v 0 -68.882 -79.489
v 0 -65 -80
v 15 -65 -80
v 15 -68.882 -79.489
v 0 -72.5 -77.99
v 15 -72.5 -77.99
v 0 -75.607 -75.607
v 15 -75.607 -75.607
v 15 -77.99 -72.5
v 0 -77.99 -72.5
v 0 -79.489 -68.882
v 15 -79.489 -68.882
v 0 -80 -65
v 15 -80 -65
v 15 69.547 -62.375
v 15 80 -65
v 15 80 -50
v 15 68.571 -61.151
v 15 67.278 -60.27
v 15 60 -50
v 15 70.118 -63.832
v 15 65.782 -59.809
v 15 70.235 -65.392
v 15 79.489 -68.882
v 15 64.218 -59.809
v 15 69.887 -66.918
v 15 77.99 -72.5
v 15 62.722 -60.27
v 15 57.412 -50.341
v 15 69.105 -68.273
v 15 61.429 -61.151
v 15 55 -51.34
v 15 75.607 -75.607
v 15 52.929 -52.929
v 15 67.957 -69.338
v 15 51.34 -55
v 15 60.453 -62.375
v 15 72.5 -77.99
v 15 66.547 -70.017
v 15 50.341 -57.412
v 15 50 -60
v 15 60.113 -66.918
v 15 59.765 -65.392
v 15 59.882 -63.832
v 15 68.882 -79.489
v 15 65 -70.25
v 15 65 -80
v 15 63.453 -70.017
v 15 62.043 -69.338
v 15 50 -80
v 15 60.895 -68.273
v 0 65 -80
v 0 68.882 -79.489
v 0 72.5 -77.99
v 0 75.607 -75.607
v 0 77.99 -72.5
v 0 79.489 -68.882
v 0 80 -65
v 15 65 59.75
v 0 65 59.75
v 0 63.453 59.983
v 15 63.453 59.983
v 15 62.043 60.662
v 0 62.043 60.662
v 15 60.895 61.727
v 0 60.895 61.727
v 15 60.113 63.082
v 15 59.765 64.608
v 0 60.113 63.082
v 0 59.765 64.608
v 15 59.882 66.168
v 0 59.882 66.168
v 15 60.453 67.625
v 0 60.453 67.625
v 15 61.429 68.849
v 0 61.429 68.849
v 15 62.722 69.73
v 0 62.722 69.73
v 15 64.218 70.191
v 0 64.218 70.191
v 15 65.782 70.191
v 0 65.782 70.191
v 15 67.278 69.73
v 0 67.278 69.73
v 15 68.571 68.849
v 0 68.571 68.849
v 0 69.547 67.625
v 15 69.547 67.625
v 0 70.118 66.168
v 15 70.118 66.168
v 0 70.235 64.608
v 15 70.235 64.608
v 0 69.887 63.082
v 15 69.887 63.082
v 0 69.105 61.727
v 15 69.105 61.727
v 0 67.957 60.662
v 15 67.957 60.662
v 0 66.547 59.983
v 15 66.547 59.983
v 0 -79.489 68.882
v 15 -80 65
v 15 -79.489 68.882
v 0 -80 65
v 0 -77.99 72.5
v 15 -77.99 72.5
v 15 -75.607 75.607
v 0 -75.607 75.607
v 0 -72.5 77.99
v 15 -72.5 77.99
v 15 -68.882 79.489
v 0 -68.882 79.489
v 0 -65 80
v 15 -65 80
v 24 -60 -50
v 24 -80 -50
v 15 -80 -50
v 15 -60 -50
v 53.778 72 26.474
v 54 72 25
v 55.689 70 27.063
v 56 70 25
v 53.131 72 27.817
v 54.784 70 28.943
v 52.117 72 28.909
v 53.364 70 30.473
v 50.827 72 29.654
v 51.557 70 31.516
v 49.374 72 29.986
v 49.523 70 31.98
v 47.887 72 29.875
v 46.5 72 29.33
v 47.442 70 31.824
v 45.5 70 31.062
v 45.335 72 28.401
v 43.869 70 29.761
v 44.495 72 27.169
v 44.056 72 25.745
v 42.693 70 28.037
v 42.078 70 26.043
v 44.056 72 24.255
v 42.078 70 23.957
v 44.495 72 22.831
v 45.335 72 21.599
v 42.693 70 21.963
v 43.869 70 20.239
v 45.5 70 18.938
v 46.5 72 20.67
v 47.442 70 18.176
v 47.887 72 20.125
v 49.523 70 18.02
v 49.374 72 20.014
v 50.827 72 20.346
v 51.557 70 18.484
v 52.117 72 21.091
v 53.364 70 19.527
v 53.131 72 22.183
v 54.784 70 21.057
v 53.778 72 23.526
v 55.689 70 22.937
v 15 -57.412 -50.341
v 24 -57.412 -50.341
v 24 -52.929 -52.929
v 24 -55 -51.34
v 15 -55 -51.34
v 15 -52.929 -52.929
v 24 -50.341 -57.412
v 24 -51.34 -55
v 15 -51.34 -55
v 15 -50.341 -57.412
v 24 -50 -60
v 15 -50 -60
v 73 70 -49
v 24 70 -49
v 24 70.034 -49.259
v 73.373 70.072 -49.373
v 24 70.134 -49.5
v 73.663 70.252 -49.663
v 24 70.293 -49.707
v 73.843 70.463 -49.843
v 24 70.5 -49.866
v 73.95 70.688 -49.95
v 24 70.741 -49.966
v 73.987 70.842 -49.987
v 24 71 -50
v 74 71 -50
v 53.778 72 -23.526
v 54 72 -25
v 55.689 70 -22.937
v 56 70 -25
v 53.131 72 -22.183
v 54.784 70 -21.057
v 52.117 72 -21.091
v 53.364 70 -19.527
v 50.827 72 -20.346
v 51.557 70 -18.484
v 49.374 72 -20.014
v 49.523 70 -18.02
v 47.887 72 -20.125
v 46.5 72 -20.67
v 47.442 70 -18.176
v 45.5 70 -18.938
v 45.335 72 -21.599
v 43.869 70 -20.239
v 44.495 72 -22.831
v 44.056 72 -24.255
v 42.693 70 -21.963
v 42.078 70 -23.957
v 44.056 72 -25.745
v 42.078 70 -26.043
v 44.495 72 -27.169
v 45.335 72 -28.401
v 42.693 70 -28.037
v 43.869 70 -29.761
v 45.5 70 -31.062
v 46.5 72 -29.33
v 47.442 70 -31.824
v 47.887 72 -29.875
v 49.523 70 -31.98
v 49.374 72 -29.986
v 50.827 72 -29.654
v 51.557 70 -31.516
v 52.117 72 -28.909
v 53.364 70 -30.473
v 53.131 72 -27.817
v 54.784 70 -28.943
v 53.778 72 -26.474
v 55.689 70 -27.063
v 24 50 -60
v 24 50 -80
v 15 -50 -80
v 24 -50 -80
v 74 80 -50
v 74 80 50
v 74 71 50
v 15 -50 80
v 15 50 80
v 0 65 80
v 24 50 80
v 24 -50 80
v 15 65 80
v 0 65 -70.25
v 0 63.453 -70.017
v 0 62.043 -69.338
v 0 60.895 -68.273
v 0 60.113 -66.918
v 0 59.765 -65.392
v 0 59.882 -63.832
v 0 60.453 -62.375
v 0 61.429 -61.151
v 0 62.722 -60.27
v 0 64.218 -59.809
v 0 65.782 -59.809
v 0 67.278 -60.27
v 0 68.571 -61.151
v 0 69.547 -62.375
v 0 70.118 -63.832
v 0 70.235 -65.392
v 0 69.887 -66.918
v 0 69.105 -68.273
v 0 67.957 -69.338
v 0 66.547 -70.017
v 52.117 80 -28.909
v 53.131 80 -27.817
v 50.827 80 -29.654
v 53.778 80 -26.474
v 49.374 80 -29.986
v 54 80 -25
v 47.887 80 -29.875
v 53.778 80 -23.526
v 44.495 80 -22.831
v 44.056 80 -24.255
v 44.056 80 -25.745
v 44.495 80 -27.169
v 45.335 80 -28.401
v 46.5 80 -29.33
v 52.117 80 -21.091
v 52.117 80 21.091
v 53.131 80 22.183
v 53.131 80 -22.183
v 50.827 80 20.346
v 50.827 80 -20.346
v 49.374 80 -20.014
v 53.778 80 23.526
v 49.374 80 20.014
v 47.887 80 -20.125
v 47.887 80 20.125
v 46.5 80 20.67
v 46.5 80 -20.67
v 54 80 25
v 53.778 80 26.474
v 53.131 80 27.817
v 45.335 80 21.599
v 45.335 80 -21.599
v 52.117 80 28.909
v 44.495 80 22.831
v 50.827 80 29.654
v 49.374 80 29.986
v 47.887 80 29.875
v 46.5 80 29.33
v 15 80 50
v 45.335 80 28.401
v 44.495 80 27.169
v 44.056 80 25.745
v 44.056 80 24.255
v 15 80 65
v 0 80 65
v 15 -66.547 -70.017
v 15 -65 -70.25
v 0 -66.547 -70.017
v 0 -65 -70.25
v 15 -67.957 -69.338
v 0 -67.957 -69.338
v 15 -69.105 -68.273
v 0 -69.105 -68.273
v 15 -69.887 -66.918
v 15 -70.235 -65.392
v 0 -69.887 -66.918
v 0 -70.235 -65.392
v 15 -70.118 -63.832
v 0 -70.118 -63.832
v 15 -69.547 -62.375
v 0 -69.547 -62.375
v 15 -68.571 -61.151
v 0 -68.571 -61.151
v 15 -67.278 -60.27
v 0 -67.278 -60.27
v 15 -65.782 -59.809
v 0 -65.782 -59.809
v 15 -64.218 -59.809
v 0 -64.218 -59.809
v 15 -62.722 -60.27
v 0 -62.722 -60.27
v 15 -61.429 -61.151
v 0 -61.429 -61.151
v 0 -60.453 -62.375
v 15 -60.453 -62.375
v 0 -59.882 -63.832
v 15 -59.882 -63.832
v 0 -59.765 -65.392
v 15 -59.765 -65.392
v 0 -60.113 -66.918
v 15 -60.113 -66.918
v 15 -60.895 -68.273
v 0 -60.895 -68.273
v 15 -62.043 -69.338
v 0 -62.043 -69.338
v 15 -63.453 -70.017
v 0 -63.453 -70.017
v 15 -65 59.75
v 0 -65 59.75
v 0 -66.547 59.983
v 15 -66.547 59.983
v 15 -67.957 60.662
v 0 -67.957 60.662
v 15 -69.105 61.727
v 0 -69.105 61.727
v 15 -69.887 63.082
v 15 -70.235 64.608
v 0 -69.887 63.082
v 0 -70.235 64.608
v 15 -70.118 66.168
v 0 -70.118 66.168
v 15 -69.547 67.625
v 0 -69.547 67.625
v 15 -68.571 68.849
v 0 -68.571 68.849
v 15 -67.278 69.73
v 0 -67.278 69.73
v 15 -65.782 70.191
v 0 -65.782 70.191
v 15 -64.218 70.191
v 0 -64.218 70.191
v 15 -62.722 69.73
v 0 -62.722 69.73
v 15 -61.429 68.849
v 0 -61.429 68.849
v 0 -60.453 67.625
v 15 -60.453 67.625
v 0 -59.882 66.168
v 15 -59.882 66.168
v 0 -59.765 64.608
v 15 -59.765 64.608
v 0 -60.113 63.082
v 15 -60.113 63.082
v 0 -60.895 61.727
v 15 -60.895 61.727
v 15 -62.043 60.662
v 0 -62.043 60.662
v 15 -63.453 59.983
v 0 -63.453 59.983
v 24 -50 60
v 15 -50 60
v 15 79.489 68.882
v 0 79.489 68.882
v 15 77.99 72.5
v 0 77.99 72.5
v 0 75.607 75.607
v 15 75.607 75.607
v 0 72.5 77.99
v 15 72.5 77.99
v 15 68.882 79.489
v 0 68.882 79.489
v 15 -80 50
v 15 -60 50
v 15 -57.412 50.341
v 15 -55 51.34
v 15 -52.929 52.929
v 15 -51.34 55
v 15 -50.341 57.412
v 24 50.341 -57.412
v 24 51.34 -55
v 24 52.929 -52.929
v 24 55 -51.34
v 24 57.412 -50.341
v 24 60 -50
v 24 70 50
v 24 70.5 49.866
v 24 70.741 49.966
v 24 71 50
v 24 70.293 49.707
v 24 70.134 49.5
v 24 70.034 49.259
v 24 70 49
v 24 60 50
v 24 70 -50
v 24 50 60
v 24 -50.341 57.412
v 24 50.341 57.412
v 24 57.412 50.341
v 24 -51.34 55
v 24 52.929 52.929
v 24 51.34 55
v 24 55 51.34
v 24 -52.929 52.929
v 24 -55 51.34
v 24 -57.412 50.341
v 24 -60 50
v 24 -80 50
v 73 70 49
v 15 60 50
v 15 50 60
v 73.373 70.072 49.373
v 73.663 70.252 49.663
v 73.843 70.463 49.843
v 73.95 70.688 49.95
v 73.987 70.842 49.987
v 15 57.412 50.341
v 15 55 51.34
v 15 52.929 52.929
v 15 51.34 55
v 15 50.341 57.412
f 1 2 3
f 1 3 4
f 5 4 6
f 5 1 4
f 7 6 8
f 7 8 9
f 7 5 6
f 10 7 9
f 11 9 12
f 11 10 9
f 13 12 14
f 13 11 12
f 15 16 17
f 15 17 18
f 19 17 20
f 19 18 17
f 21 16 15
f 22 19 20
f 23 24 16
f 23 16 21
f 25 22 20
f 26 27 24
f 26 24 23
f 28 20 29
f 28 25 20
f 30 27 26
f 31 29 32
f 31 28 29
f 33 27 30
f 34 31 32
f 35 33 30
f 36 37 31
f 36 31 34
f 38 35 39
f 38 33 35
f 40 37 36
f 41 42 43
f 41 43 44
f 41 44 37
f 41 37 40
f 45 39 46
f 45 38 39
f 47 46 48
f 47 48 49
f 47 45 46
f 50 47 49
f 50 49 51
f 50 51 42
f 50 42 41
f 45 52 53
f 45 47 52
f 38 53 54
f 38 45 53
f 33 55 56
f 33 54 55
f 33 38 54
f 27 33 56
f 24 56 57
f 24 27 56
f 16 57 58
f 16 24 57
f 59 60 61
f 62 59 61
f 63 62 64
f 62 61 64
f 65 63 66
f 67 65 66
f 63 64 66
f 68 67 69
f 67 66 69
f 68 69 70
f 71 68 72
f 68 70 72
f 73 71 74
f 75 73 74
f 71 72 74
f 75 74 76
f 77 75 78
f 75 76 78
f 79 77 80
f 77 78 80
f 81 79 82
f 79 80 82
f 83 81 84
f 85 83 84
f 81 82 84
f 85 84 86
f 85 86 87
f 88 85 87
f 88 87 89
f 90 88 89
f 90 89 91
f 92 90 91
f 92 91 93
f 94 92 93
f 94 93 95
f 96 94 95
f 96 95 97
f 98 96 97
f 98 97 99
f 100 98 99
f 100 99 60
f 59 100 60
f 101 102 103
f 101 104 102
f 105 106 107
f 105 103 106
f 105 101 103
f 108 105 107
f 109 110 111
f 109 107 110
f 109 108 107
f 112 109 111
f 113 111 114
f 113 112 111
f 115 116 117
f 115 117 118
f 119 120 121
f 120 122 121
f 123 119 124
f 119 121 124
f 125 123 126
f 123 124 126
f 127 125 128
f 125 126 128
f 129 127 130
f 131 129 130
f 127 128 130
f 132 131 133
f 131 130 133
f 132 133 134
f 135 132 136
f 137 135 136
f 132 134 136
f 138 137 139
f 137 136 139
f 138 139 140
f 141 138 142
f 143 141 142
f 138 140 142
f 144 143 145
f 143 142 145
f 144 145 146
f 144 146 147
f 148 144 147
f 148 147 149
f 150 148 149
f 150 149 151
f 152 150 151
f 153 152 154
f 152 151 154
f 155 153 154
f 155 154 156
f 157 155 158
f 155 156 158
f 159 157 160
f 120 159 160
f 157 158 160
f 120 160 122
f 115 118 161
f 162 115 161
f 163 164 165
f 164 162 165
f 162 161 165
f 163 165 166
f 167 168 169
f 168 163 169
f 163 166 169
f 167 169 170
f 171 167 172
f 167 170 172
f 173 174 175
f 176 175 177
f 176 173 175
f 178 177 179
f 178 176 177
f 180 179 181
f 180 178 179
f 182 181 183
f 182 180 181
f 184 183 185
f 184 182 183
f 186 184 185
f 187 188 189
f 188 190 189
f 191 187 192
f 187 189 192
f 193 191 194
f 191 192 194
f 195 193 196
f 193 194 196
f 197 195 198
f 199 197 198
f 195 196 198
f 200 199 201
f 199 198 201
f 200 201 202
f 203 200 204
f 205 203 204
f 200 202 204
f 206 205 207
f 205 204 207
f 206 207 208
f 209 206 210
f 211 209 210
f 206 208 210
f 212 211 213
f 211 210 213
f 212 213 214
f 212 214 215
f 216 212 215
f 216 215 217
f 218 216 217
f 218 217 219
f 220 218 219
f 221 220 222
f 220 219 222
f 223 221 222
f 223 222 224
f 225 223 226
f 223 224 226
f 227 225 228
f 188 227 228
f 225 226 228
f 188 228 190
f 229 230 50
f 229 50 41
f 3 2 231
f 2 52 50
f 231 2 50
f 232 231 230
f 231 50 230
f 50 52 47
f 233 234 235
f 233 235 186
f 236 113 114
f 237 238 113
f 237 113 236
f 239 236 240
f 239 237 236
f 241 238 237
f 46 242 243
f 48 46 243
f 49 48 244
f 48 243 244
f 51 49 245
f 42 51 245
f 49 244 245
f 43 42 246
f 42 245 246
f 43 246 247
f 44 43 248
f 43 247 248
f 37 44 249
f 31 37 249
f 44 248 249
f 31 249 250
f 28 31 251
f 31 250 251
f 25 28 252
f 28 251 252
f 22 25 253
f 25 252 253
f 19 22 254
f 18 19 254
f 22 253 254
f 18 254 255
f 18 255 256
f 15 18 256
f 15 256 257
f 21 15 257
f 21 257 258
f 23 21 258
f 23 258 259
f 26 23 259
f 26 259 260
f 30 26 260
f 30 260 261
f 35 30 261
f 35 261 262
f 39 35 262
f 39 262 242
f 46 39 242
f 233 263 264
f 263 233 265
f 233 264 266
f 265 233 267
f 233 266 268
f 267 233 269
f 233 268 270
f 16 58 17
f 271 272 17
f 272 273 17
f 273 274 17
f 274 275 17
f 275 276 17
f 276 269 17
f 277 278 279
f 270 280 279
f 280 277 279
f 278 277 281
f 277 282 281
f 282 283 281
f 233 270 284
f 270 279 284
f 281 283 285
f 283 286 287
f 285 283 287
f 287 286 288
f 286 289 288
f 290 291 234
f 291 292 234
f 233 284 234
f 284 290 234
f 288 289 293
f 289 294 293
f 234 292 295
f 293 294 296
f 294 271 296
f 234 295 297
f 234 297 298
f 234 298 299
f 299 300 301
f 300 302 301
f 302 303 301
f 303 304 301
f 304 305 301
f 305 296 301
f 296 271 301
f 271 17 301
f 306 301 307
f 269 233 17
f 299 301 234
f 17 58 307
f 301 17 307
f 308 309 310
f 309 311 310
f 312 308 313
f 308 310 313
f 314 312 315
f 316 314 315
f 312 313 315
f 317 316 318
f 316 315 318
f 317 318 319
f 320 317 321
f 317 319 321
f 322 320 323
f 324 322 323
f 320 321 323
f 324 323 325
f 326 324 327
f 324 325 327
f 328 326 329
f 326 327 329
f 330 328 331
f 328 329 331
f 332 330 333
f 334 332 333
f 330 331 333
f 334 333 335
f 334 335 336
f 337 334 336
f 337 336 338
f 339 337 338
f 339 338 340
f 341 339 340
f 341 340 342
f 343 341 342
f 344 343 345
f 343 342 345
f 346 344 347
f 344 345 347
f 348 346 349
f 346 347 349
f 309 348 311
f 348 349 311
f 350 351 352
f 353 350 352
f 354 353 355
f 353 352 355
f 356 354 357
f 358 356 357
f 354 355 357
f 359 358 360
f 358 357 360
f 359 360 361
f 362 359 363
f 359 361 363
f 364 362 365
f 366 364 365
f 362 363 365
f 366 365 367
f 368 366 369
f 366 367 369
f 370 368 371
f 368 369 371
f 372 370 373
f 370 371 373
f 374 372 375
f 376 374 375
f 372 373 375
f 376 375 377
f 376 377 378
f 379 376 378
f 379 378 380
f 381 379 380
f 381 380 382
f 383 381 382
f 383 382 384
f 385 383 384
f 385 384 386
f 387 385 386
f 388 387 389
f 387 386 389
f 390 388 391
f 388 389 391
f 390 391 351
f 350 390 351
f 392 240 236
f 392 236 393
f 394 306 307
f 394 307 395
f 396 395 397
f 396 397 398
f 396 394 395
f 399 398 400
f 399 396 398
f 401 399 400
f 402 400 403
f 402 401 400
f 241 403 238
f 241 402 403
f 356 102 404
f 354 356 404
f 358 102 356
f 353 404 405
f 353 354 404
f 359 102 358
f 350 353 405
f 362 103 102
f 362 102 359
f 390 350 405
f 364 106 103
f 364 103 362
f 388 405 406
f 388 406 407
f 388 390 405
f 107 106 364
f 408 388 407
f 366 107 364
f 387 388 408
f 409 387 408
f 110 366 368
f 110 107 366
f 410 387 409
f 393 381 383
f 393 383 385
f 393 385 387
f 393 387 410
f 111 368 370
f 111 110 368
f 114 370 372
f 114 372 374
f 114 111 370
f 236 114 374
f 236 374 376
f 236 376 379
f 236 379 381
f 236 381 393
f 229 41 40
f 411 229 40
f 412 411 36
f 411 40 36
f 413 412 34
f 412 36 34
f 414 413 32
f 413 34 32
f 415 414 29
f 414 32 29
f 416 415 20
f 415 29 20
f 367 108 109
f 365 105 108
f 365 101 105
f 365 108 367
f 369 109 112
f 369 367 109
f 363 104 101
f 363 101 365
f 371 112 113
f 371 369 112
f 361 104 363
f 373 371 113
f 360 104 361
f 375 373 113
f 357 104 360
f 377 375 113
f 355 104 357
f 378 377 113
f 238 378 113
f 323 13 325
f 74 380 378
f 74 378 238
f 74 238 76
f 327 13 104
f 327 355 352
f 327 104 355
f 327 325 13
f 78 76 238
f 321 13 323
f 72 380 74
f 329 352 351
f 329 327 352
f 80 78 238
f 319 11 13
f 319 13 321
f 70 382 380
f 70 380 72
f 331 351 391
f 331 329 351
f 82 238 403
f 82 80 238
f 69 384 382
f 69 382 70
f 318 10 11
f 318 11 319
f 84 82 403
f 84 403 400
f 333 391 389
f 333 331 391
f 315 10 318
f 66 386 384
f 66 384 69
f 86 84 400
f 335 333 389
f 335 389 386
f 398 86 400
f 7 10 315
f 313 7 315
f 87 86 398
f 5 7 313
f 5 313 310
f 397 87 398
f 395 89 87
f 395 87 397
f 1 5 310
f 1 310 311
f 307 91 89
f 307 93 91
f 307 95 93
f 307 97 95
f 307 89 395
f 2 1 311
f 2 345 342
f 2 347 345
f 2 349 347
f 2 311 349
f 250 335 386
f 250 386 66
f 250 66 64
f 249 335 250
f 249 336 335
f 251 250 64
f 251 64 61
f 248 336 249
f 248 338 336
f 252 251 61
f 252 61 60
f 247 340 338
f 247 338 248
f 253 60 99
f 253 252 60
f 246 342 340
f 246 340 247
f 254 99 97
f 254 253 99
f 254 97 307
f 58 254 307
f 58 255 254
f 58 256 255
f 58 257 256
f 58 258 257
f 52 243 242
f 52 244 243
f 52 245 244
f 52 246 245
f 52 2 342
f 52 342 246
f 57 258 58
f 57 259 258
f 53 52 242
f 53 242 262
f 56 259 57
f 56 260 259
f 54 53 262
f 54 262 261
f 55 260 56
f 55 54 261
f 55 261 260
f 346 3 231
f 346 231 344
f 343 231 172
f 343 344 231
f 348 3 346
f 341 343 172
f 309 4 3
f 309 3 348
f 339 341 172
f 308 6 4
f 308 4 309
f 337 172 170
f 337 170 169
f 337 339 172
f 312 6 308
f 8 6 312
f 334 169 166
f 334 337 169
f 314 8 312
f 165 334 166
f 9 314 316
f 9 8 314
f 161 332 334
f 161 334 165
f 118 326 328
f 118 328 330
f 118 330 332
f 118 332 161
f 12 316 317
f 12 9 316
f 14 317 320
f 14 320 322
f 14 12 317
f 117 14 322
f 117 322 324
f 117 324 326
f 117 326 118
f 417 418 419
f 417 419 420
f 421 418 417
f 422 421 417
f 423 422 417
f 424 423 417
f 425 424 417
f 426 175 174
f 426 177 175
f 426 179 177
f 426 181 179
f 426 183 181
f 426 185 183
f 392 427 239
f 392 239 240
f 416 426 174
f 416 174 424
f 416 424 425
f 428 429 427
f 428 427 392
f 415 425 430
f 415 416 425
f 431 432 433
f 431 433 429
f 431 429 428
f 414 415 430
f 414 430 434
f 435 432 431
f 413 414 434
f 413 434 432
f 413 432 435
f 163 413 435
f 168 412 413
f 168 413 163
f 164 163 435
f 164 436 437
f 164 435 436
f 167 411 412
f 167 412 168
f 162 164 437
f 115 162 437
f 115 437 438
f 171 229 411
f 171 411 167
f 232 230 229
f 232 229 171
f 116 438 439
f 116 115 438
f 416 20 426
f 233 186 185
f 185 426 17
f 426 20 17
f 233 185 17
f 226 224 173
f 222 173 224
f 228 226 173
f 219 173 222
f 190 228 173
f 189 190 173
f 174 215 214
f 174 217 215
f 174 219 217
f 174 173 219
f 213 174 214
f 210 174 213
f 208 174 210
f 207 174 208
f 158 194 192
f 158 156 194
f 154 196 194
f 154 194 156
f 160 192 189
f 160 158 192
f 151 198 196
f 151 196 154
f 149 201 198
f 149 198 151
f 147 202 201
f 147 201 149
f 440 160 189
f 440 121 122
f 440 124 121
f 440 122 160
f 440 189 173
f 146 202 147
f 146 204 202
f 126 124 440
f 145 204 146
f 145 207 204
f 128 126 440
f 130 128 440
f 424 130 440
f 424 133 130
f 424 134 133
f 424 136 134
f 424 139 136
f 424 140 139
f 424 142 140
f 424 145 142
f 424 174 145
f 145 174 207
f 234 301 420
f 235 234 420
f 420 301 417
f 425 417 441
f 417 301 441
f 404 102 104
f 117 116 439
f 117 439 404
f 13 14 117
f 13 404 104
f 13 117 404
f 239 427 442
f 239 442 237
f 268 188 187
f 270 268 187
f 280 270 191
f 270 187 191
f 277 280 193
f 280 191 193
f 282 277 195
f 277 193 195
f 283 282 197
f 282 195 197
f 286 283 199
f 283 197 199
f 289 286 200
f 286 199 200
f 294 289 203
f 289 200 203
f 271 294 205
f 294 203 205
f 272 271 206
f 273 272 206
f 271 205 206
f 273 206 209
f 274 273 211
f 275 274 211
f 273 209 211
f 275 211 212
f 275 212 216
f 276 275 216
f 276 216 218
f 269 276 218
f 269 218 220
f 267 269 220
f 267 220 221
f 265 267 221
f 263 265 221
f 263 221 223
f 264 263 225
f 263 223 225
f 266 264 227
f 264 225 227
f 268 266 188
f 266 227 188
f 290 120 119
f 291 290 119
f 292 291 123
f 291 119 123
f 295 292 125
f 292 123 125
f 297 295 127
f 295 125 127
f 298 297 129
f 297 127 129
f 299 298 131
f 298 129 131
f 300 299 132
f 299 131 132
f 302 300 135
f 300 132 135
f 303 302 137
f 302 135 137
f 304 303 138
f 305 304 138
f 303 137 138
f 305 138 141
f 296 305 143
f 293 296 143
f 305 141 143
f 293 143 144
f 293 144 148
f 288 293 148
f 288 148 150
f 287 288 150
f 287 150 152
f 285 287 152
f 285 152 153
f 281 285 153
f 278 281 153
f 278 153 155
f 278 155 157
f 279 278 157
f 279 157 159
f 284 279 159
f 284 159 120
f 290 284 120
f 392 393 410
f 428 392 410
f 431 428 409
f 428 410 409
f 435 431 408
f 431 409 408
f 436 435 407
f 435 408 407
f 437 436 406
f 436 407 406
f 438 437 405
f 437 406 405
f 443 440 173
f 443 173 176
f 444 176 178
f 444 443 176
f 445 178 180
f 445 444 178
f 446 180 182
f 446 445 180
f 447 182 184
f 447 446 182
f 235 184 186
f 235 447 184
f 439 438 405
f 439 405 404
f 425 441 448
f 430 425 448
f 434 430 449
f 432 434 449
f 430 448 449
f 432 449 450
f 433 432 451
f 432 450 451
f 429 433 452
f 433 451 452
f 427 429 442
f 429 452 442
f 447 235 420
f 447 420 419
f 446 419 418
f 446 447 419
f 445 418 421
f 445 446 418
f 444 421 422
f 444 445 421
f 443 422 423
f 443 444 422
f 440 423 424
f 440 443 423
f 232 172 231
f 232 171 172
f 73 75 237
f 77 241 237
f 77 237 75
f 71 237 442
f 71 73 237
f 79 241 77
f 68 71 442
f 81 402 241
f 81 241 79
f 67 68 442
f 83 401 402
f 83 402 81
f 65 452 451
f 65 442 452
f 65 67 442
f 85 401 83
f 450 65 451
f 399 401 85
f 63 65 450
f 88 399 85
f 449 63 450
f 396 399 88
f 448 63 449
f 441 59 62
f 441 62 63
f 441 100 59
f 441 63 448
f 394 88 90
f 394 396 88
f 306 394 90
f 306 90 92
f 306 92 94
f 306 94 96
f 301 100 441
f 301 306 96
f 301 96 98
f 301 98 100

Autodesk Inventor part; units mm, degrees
ref_plane "YZ Plane" through (0, 0, 0) normal (1, 0, 0) x (0, 1, 0)
ref_plane "XZ Plane" through (0, 0, 0) normal (0, 1, 0) x (-1, 0, 0)
ref_plane "XY Plane" through (0, 0, 0) normal (0, 0, 1) x (1, 0, 0)
sketch "Skizze1" plane through (0, 0, 0) normal (0, 0, 1) x (1, 0, 0)
  line L0 (0, 80) -> (24, 80)
  line L1 (24, 80) -> (24, -80)
  line L2 (24, -80) -> (0, -80)
  line L3 (0, -80) -> (0, 80)
  line L4 (24, 40) -> (124, 40)
  line L5 (124, 40) -> (124, -40)
  line L6 (124, -40) -> (24, -40)
  line L7 (24, -40) -> (24, 40)
  point P0 (0, 0)
  point P1 (24, 0)
  point P2 (0, 0)
  point P3 (94, 0)
  point P4 (124, 0)
  dimension "d0" = 160
  dimension "d1" = 24
  dimension "d2" = 124
  dimension "d3" = 80
  dimension "d4" = 94
extrude "Extrusion1" add sketch "Skizze1" along normal mid plane 160 contours L0 L1 L2 L3
sketch "Skizze2" plane through (24, -80, 80) normal (1, 0, 0) x (0, 0, -1)
  line L0 (0, 160) -> (30, 160)
  line L1 (30, 160) -> (30, 130)
  line L2 (30, 130) -> (0, 130)
  line L3 (0, 130) -> (0, 160)
  point P0 (80, 80)
  dimension "d19" = 30
  dimension "d20" = 30
extrude "Extrusion4" cut sketch "Skizze2" against normal blind 9
pattern_circular "Runde Anordnung1" count 4 over 360 about axis through (-10, 0, 0) along (1, 0, 0) of "Extrusion4"
sketch "Skizze3" plane through (24, 50, 50) normal (1, 0, 0) x (0, 0, -1)
  line L0 (-15, 15) -> (115, 15)
  line L1 (115, 15) -> (115, -115)
  line L2 (115, -115) -> (-15, -115)
  line L3 (-15, -115) -> (-15, 15)
  line L4 (-15, 15) -> (115, -115) construction
  line L5 (115, 15) -> (-15, -115) construction
  point P0 (50, -50)
  dimension "d26" = 130
  dimension "d27" = 130
hole "Bohrung2" at (24, 65, 65) at (24, -65, 65) at (24, 65, -65) at (24, -65, -65) direction (-1, 0, 0) diameter 10.5 end through all
fillet "Rundung2" radius 15 4 edges at (7.5, 80, -80) (7.5, -80, -80) (7.5, -80, 80) (7.5, 80, 80)
fillet "Rundung3" radius 10 4 edges at (19.5, -50, 50) (19.5, -50, -50) (19.5, 50, -50) (19.5, 50, 50)
sketch "Skizze4" plane through (24, -50, 80) normal (1, 0, 0) x (0, 0, -1)
  line L0 (130, 130) -> (30, 130) projected
  line L1 (130, -30) -> (30, -30) projected
  line L2 (130, 130) -> (30, 130)
  line L3 (30, 130) -> (30, -30)
  line L4 (30, -30) -> (130, -30)
  line L5 (130, -30) -> (130, 130)
  line L6 (130, 110) -> (130, 130) projected
  line L7 (30, 130) -> (130, 130)
  line L8 (130, 130) -> (130, 120)
  line L9 (130, 120) -> (30, 120)
  line L10 (30, 120) -> (30, 130)
  point P0 (80, 50)
  dimension "d37" = 10
extrude "Extrusion5" add sketch "Skizze4" along normal blind 50 contours L5 L9 L3 L0
sketch "Skizze5" plane through (24, 70, -50) normal (0, -1, 0) x (1, 0, 0)
  circle A0 centre (25, 25) radius 5
  circle A1 centre (25, 75) radius 5
  point P0 (-24, 50)
  dimension "d40" = 10
  dimension "d41" = 10
extrude "Extrusion6" cut sketch "Skizze5" against normal blind 10
chamfer "Fase1" distance 2 angle 45 2 edges at (44, 70, -25) (44, 70, 25)
fillet "Rundung4" radius 1 3 edges at (74, 70, 0) (49, 70, -50) (49, 70, 50)
equation "\"d5\" = d0"
properties part number "Gelenkflansch" material "Stahl AISI 4130"
